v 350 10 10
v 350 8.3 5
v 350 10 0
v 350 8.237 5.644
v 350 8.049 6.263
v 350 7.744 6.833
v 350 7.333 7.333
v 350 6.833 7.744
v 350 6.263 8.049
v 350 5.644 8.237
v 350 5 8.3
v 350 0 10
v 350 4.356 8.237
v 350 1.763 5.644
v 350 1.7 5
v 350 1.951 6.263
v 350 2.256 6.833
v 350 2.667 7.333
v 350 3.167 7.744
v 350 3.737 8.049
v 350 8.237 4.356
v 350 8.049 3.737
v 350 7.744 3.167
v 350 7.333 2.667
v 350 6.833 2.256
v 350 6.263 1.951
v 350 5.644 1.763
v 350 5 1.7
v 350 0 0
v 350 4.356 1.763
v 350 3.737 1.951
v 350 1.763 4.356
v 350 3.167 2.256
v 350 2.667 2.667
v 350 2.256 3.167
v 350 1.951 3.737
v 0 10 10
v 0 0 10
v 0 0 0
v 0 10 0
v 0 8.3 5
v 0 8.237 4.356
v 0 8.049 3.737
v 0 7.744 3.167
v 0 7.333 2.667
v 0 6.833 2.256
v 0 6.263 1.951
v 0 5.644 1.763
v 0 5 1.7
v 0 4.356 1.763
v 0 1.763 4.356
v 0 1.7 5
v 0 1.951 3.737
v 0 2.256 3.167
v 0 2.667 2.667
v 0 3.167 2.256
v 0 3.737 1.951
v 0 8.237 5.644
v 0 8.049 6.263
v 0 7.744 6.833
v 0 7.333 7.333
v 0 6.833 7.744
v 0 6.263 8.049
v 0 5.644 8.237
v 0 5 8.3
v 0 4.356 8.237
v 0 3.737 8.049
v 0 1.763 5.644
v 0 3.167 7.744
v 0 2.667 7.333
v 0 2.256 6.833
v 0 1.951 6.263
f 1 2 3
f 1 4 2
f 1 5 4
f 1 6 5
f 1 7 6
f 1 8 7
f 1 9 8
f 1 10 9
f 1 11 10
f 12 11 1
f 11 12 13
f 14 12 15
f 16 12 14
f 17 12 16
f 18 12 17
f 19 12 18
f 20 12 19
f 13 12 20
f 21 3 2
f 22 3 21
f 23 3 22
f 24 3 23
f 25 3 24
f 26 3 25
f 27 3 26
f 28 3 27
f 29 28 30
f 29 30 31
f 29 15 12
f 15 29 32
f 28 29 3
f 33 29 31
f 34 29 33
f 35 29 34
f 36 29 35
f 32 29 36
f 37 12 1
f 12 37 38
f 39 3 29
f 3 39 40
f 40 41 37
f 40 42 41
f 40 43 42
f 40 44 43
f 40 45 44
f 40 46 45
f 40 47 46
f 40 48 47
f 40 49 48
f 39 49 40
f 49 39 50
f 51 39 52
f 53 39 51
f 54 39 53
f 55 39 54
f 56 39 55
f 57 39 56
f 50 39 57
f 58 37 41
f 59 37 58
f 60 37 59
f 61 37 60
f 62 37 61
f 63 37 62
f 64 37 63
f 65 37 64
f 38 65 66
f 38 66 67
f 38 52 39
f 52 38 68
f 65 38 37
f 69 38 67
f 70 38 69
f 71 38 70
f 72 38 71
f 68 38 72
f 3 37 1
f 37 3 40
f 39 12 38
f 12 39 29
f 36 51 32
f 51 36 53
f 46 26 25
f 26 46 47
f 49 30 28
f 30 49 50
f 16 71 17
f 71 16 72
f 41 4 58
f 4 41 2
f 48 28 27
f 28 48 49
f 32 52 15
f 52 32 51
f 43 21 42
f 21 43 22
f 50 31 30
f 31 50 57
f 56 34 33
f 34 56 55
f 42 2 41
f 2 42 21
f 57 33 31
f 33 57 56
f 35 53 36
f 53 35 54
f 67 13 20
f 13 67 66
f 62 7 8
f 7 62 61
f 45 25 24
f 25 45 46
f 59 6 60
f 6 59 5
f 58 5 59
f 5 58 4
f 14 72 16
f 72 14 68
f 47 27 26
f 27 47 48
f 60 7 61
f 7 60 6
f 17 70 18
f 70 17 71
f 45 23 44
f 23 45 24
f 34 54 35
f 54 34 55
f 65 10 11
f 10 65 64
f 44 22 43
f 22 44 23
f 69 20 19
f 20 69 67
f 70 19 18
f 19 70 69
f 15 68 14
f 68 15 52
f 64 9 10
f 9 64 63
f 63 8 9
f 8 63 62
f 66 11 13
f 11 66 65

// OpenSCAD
difference() {
    cube([350, 10, 10]);
    translate([0, 5, 5])
        rotate([0, 90, 0])
            cylinder(h=350, r=3.3, $fn=32);
}
